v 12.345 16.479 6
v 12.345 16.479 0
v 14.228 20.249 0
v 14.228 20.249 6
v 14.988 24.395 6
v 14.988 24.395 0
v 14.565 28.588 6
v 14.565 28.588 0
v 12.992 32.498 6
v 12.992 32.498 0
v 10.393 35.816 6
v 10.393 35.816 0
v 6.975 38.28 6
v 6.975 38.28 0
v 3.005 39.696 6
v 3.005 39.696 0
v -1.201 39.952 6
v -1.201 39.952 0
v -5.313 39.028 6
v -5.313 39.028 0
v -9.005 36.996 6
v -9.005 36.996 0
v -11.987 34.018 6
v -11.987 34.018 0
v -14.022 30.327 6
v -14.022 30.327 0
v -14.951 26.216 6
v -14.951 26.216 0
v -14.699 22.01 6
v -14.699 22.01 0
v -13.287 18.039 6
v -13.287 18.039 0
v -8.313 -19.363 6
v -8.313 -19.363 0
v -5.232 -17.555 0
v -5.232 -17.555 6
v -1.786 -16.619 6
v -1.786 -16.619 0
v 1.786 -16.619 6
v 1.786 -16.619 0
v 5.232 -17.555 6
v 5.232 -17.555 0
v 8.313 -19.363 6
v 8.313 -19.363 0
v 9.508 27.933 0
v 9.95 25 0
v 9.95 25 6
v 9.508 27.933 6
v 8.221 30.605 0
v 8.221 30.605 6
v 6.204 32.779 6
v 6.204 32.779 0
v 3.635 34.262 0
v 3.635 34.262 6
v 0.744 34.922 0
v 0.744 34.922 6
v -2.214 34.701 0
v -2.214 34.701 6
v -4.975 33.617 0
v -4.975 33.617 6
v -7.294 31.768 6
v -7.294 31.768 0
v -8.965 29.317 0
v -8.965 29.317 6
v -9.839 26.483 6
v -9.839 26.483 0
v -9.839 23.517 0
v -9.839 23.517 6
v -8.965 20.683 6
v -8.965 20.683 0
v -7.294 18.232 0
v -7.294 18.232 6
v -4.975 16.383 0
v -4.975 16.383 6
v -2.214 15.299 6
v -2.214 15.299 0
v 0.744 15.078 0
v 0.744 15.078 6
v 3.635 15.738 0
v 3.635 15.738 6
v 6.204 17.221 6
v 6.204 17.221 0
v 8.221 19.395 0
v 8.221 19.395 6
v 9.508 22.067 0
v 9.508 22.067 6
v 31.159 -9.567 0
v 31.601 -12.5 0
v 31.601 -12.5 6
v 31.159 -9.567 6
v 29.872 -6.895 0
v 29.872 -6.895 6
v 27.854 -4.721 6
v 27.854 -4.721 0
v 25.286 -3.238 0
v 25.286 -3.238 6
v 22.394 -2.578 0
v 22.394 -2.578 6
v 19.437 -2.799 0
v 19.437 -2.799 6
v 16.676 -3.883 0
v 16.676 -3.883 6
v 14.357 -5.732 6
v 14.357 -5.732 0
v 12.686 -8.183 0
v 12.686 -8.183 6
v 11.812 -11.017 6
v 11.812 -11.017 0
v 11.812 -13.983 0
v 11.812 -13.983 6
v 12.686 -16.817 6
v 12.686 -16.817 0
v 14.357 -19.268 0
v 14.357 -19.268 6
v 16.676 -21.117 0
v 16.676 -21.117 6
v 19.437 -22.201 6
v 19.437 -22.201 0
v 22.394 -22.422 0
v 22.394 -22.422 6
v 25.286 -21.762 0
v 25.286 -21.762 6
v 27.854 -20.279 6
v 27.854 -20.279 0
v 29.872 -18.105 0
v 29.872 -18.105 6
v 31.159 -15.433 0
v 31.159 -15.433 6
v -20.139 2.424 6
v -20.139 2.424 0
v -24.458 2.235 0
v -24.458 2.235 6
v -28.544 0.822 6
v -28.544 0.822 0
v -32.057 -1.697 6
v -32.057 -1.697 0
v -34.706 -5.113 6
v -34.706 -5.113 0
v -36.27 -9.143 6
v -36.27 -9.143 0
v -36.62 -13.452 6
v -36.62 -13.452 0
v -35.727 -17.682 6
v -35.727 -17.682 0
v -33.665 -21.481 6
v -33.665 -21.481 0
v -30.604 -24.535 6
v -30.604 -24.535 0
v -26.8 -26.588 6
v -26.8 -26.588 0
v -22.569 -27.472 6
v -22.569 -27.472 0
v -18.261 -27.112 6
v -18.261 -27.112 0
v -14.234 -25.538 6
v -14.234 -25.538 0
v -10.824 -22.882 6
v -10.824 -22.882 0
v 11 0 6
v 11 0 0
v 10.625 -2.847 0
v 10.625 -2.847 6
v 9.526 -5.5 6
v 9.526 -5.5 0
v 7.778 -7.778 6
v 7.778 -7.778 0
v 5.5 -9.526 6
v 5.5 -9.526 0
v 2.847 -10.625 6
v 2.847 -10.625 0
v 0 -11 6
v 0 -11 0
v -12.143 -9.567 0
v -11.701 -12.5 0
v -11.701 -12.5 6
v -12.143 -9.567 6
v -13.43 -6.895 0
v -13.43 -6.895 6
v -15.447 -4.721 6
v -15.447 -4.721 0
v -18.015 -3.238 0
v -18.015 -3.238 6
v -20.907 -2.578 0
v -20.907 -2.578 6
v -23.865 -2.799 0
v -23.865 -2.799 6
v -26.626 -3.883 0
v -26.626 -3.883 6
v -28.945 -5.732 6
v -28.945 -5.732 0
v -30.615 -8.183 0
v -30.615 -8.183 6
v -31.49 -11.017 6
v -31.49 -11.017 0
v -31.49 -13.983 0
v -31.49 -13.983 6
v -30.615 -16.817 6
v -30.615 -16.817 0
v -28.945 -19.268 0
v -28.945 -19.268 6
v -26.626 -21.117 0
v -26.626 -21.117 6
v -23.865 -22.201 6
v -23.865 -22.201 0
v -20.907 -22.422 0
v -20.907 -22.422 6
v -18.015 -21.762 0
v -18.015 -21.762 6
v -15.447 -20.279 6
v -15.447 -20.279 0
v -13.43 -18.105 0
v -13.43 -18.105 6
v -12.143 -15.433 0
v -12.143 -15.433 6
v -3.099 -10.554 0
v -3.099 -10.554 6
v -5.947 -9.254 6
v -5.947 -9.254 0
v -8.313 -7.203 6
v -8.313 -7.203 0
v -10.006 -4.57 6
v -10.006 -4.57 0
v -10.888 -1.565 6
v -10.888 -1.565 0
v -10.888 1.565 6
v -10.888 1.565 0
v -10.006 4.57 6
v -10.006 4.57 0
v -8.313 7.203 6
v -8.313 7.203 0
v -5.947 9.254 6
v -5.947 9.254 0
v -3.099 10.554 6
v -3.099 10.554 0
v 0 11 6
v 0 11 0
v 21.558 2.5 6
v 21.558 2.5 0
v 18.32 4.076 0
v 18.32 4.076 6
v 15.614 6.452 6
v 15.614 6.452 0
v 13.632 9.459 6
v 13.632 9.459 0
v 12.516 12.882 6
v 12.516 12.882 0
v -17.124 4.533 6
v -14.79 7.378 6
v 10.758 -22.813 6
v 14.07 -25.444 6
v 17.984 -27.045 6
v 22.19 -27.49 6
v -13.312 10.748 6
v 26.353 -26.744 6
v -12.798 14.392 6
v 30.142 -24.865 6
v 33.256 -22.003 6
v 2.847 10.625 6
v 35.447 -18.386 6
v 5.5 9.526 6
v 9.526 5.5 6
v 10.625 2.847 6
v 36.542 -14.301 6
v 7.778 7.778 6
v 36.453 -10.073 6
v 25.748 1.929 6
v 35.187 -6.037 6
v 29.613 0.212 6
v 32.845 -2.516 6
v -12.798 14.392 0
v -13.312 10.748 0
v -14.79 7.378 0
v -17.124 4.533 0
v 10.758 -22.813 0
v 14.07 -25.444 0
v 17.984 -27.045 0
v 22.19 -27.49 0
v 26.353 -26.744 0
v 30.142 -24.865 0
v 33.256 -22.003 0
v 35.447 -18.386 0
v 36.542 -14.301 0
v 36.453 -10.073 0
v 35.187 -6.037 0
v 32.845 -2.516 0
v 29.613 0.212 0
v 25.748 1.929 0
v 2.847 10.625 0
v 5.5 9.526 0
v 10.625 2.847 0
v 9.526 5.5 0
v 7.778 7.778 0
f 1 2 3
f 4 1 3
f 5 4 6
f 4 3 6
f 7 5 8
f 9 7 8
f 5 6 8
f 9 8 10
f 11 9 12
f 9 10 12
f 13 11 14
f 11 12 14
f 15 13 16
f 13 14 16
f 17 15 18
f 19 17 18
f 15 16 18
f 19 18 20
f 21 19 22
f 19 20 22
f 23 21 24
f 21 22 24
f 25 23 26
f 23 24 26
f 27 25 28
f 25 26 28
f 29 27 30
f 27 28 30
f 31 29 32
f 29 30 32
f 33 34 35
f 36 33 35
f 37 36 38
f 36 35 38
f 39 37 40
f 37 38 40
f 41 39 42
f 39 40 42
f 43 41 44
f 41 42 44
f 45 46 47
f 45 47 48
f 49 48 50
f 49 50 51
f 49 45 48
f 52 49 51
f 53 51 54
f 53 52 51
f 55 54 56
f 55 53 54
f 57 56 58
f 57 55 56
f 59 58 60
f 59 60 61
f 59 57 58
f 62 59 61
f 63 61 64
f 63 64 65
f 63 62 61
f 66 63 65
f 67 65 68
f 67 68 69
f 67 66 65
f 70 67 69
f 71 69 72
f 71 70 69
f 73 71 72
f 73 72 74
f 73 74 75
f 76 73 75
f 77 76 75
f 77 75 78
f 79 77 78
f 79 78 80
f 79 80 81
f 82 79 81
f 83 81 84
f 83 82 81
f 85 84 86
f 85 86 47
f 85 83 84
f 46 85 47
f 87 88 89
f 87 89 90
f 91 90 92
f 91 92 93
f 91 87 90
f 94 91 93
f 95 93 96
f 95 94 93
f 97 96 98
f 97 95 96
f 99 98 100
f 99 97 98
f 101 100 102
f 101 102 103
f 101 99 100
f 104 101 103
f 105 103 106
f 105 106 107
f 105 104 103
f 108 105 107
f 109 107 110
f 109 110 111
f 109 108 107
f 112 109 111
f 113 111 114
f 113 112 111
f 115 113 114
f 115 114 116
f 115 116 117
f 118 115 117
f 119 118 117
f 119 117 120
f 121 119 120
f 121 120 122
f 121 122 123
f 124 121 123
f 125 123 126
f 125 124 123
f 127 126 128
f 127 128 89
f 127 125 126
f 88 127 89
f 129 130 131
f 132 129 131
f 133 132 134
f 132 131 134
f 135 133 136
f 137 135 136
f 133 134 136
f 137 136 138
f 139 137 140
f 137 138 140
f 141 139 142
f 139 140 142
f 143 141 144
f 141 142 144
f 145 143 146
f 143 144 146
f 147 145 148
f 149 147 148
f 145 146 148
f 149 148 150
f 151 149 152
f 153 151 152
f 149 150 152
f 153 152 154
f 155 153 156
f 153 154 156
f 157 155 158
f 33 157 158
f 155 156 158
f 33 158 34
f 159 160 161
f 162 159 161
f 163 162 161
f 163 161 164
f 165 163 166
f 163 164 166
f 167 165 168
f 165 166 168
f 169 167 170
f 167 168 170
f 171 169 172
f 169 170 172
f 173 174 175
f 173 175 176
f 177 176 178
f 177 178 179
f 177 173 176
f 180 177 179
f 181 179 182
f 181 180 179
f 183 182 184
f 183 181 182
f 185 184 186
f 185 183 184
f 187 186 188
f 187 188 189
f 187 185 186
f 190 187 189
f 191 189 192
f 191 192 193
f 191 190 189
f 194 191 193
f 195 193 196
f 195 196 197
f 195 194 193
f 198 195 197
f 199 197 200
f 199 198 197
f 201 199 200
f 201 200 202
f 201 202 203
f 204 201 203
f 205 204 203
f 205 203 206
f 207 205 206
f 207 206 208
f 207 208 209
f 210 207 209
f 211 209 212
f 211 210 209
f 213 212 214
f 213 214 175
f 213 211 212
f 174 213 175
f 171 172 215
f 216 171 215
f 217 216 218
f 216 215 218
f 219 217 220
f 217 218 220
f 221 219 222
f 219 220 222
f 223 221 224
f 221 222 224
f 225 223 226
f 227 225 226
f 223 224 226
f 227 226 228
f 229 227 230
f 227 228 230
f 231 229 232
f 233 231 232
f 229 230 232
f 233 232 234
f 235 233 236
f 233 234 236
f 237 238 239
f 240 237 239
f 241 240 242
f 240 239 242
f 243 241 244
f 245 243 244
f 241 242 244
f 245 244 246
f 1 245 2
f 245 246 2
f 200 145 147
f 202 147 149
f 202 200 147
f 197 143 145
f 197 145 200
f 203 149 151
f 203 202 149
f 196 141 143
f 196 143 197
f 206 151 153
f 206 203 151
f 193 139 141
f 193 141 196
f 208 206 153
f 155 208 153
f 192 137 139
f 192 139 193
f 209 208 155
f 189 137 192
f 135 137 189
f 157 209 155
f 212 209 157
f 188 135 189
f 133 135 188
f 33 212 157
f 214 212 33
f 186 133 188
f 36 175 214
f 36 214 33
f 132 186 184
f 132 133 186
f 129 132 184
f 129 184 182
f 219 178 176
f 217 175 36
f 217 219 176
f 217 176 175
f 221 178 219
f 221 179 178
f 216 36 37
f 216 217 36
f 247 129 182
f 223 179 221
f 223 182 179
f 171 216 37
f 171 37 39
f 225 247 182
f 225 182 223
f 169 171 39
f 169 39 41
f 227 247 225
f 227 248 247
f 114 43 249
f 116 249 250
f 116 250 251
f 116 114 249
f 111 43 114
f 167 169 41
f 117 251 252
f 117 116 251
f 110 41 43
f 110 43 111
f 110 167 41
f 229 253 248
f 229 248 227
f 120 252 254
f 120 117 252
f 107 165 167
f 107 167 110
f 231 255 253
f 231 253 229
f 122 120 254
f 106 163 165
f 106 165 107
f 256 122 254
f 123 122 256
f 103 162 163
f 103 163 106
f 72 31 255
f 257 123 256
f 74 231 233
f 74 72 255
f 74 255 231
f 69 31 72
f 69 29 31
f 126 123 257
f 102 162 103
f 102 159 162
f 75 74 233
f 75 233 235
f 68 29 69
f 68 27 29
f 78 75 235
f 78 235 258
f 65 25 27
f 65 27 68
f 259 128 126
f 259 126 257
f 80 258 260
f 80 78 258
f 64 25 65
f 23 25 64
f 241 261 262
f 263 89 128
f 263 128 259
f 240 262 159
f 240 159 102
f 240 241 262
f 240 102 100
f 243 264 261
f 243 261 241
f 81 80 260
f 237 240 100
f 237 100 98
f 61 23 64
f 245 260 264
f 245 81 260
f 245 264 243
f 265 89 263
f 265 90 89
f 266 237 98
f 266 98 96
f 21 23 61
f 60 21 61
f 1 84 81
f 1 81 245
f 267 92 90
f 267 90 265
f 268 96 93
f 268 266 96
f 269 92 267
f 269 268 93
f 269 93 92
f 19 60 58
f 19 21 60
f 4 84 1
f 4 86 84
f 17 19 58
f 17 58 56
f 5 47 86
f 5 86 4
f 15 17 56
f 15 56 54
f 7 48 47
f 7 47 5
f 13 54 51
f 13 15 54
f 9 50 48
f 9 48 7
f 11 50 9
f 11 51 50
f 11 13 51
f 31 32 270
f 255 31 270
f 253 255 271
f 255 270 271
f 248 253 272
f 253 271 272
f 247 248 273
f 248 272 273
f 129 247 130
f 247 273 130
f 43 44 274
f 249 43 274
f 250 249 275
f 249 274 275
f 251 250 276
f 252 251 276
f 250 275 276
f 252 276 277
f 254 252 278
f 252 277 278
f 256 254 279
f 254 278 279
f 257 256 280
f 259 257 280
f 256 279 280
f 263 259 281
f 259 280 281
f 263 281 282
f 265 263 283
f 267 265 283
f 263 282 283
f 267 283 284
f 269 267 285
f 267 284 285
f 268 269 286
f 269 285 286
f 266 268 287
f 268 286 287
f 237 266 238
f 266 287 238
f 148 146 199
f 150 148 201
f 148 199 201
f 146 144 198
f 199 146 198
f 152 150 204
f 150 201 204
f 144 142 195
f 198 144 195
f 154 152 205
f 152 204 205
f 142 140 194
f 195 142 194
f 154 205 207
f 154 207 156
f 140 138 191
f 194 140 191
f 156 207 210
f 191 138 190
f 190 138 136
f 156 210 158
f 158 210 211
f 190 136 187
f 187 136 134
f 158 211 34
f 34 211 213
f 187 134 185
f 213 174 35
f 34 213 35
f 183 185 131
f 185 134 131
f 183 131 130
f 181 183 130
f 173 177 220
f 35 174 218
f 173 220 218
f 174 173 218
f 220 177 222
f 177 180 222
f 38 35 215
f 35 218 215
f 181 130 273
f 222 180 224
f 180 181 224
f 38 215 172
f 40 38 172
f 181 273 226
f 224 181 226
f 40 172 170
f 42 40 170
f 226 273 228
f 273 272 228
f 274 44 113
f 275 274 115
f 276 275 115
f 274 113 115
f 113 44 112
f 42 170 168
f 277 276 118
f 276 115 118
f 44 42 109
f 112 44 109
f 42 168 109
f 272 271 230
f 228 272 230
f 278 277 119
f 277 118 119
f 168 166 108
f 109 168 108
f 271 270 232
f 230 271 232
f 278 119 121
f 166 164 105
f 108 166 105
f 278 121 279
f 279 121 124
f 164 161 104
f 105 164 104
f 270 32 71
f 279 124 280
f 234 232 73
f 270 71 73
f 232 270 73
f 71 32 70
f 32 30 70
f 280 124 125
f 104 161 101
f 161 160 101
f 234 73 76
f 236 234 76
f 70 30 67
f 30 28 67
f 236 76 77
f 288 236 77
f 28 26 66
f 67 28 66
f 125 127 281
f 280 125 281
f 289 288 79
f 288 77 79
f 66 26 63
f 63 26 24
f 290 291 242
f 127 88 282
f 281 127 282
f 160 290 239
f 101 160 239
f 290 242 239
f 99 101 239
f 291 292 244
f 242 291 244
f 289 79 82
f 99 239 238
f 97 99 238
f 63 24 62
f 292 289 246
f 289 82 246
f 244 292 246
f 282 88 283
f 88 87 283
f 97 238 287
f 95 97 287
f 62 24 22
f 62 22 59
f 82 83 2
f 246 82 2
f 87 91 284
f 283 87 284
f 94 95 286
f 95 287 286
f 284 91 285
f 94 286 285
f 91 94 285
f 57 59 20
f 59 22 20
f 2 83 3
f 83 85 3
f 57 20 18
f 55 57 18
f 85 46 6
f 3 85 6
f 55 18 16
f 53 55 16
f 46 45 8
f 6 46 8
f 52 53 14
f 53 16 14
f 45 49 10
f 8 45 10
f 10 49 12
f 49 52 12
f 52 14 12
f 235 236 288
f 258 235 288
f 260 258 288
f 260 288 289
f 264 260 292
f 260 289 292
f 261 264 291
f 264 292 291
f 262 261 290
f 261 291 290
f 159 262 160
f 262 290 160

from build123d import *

# Parameters (mm, degrees)
F0_R     = 9.95
F1_DEPTH = 6


with BuildPart() as f1:
    # F0 (on Top) → F1 (new body)
    with BuildSketch(Plane.XY):
        with BuildLine():
            ThreePointArc((21.557813, 2.499713), (14.522567, 7.888802), (12.344861, 16.479178))
            ThreePointArc((12.344861, 16.479178), (0.911041, 39.972308), (-13.286915, 18.03883))
            ThreePointArc((-13.286915, 18.03883), (-13.935579, 9.012352), (-20.139405, 2.423679))
            ThreePointArc((-20.139405, 2.423679), (-34.833486, -19.656287), (-8.312649, -19.362807))
            ThreePointArc((-8.312649, -19.362807), (0, -16.5), (8.312649, -19.362807))
            ThreePointArc((8.312649, -19.362807), (34.479863, -20.272445), (21.557813, 2.499713))
        make_face()
        with Locations((-21.650635, -12.5)):
            Circle(F0_R, mode=Mode.SUBTRACT)
        with Locations((21.650635, -12.5)):
            Circle(F0_R, mode=Mode.SUBTRACT)
        with BuildLine():
            ThreePointArc((0, 11), (7.778175, 7.778175), (11, 0))
            ThreePointArc((11, 0), (7.778175, -7.778175), (0, -11))
            ThreePointArc((0, -11), (-11, 0), (0, 11))
        make_face(mode=Mode.SUBTRACT)
        with Locations((0, 25)):
            Circle(F0_R, mode=Mode.SUBTRACT)
    extrude(amount=F1_DEPTH)


solid = f1.part
